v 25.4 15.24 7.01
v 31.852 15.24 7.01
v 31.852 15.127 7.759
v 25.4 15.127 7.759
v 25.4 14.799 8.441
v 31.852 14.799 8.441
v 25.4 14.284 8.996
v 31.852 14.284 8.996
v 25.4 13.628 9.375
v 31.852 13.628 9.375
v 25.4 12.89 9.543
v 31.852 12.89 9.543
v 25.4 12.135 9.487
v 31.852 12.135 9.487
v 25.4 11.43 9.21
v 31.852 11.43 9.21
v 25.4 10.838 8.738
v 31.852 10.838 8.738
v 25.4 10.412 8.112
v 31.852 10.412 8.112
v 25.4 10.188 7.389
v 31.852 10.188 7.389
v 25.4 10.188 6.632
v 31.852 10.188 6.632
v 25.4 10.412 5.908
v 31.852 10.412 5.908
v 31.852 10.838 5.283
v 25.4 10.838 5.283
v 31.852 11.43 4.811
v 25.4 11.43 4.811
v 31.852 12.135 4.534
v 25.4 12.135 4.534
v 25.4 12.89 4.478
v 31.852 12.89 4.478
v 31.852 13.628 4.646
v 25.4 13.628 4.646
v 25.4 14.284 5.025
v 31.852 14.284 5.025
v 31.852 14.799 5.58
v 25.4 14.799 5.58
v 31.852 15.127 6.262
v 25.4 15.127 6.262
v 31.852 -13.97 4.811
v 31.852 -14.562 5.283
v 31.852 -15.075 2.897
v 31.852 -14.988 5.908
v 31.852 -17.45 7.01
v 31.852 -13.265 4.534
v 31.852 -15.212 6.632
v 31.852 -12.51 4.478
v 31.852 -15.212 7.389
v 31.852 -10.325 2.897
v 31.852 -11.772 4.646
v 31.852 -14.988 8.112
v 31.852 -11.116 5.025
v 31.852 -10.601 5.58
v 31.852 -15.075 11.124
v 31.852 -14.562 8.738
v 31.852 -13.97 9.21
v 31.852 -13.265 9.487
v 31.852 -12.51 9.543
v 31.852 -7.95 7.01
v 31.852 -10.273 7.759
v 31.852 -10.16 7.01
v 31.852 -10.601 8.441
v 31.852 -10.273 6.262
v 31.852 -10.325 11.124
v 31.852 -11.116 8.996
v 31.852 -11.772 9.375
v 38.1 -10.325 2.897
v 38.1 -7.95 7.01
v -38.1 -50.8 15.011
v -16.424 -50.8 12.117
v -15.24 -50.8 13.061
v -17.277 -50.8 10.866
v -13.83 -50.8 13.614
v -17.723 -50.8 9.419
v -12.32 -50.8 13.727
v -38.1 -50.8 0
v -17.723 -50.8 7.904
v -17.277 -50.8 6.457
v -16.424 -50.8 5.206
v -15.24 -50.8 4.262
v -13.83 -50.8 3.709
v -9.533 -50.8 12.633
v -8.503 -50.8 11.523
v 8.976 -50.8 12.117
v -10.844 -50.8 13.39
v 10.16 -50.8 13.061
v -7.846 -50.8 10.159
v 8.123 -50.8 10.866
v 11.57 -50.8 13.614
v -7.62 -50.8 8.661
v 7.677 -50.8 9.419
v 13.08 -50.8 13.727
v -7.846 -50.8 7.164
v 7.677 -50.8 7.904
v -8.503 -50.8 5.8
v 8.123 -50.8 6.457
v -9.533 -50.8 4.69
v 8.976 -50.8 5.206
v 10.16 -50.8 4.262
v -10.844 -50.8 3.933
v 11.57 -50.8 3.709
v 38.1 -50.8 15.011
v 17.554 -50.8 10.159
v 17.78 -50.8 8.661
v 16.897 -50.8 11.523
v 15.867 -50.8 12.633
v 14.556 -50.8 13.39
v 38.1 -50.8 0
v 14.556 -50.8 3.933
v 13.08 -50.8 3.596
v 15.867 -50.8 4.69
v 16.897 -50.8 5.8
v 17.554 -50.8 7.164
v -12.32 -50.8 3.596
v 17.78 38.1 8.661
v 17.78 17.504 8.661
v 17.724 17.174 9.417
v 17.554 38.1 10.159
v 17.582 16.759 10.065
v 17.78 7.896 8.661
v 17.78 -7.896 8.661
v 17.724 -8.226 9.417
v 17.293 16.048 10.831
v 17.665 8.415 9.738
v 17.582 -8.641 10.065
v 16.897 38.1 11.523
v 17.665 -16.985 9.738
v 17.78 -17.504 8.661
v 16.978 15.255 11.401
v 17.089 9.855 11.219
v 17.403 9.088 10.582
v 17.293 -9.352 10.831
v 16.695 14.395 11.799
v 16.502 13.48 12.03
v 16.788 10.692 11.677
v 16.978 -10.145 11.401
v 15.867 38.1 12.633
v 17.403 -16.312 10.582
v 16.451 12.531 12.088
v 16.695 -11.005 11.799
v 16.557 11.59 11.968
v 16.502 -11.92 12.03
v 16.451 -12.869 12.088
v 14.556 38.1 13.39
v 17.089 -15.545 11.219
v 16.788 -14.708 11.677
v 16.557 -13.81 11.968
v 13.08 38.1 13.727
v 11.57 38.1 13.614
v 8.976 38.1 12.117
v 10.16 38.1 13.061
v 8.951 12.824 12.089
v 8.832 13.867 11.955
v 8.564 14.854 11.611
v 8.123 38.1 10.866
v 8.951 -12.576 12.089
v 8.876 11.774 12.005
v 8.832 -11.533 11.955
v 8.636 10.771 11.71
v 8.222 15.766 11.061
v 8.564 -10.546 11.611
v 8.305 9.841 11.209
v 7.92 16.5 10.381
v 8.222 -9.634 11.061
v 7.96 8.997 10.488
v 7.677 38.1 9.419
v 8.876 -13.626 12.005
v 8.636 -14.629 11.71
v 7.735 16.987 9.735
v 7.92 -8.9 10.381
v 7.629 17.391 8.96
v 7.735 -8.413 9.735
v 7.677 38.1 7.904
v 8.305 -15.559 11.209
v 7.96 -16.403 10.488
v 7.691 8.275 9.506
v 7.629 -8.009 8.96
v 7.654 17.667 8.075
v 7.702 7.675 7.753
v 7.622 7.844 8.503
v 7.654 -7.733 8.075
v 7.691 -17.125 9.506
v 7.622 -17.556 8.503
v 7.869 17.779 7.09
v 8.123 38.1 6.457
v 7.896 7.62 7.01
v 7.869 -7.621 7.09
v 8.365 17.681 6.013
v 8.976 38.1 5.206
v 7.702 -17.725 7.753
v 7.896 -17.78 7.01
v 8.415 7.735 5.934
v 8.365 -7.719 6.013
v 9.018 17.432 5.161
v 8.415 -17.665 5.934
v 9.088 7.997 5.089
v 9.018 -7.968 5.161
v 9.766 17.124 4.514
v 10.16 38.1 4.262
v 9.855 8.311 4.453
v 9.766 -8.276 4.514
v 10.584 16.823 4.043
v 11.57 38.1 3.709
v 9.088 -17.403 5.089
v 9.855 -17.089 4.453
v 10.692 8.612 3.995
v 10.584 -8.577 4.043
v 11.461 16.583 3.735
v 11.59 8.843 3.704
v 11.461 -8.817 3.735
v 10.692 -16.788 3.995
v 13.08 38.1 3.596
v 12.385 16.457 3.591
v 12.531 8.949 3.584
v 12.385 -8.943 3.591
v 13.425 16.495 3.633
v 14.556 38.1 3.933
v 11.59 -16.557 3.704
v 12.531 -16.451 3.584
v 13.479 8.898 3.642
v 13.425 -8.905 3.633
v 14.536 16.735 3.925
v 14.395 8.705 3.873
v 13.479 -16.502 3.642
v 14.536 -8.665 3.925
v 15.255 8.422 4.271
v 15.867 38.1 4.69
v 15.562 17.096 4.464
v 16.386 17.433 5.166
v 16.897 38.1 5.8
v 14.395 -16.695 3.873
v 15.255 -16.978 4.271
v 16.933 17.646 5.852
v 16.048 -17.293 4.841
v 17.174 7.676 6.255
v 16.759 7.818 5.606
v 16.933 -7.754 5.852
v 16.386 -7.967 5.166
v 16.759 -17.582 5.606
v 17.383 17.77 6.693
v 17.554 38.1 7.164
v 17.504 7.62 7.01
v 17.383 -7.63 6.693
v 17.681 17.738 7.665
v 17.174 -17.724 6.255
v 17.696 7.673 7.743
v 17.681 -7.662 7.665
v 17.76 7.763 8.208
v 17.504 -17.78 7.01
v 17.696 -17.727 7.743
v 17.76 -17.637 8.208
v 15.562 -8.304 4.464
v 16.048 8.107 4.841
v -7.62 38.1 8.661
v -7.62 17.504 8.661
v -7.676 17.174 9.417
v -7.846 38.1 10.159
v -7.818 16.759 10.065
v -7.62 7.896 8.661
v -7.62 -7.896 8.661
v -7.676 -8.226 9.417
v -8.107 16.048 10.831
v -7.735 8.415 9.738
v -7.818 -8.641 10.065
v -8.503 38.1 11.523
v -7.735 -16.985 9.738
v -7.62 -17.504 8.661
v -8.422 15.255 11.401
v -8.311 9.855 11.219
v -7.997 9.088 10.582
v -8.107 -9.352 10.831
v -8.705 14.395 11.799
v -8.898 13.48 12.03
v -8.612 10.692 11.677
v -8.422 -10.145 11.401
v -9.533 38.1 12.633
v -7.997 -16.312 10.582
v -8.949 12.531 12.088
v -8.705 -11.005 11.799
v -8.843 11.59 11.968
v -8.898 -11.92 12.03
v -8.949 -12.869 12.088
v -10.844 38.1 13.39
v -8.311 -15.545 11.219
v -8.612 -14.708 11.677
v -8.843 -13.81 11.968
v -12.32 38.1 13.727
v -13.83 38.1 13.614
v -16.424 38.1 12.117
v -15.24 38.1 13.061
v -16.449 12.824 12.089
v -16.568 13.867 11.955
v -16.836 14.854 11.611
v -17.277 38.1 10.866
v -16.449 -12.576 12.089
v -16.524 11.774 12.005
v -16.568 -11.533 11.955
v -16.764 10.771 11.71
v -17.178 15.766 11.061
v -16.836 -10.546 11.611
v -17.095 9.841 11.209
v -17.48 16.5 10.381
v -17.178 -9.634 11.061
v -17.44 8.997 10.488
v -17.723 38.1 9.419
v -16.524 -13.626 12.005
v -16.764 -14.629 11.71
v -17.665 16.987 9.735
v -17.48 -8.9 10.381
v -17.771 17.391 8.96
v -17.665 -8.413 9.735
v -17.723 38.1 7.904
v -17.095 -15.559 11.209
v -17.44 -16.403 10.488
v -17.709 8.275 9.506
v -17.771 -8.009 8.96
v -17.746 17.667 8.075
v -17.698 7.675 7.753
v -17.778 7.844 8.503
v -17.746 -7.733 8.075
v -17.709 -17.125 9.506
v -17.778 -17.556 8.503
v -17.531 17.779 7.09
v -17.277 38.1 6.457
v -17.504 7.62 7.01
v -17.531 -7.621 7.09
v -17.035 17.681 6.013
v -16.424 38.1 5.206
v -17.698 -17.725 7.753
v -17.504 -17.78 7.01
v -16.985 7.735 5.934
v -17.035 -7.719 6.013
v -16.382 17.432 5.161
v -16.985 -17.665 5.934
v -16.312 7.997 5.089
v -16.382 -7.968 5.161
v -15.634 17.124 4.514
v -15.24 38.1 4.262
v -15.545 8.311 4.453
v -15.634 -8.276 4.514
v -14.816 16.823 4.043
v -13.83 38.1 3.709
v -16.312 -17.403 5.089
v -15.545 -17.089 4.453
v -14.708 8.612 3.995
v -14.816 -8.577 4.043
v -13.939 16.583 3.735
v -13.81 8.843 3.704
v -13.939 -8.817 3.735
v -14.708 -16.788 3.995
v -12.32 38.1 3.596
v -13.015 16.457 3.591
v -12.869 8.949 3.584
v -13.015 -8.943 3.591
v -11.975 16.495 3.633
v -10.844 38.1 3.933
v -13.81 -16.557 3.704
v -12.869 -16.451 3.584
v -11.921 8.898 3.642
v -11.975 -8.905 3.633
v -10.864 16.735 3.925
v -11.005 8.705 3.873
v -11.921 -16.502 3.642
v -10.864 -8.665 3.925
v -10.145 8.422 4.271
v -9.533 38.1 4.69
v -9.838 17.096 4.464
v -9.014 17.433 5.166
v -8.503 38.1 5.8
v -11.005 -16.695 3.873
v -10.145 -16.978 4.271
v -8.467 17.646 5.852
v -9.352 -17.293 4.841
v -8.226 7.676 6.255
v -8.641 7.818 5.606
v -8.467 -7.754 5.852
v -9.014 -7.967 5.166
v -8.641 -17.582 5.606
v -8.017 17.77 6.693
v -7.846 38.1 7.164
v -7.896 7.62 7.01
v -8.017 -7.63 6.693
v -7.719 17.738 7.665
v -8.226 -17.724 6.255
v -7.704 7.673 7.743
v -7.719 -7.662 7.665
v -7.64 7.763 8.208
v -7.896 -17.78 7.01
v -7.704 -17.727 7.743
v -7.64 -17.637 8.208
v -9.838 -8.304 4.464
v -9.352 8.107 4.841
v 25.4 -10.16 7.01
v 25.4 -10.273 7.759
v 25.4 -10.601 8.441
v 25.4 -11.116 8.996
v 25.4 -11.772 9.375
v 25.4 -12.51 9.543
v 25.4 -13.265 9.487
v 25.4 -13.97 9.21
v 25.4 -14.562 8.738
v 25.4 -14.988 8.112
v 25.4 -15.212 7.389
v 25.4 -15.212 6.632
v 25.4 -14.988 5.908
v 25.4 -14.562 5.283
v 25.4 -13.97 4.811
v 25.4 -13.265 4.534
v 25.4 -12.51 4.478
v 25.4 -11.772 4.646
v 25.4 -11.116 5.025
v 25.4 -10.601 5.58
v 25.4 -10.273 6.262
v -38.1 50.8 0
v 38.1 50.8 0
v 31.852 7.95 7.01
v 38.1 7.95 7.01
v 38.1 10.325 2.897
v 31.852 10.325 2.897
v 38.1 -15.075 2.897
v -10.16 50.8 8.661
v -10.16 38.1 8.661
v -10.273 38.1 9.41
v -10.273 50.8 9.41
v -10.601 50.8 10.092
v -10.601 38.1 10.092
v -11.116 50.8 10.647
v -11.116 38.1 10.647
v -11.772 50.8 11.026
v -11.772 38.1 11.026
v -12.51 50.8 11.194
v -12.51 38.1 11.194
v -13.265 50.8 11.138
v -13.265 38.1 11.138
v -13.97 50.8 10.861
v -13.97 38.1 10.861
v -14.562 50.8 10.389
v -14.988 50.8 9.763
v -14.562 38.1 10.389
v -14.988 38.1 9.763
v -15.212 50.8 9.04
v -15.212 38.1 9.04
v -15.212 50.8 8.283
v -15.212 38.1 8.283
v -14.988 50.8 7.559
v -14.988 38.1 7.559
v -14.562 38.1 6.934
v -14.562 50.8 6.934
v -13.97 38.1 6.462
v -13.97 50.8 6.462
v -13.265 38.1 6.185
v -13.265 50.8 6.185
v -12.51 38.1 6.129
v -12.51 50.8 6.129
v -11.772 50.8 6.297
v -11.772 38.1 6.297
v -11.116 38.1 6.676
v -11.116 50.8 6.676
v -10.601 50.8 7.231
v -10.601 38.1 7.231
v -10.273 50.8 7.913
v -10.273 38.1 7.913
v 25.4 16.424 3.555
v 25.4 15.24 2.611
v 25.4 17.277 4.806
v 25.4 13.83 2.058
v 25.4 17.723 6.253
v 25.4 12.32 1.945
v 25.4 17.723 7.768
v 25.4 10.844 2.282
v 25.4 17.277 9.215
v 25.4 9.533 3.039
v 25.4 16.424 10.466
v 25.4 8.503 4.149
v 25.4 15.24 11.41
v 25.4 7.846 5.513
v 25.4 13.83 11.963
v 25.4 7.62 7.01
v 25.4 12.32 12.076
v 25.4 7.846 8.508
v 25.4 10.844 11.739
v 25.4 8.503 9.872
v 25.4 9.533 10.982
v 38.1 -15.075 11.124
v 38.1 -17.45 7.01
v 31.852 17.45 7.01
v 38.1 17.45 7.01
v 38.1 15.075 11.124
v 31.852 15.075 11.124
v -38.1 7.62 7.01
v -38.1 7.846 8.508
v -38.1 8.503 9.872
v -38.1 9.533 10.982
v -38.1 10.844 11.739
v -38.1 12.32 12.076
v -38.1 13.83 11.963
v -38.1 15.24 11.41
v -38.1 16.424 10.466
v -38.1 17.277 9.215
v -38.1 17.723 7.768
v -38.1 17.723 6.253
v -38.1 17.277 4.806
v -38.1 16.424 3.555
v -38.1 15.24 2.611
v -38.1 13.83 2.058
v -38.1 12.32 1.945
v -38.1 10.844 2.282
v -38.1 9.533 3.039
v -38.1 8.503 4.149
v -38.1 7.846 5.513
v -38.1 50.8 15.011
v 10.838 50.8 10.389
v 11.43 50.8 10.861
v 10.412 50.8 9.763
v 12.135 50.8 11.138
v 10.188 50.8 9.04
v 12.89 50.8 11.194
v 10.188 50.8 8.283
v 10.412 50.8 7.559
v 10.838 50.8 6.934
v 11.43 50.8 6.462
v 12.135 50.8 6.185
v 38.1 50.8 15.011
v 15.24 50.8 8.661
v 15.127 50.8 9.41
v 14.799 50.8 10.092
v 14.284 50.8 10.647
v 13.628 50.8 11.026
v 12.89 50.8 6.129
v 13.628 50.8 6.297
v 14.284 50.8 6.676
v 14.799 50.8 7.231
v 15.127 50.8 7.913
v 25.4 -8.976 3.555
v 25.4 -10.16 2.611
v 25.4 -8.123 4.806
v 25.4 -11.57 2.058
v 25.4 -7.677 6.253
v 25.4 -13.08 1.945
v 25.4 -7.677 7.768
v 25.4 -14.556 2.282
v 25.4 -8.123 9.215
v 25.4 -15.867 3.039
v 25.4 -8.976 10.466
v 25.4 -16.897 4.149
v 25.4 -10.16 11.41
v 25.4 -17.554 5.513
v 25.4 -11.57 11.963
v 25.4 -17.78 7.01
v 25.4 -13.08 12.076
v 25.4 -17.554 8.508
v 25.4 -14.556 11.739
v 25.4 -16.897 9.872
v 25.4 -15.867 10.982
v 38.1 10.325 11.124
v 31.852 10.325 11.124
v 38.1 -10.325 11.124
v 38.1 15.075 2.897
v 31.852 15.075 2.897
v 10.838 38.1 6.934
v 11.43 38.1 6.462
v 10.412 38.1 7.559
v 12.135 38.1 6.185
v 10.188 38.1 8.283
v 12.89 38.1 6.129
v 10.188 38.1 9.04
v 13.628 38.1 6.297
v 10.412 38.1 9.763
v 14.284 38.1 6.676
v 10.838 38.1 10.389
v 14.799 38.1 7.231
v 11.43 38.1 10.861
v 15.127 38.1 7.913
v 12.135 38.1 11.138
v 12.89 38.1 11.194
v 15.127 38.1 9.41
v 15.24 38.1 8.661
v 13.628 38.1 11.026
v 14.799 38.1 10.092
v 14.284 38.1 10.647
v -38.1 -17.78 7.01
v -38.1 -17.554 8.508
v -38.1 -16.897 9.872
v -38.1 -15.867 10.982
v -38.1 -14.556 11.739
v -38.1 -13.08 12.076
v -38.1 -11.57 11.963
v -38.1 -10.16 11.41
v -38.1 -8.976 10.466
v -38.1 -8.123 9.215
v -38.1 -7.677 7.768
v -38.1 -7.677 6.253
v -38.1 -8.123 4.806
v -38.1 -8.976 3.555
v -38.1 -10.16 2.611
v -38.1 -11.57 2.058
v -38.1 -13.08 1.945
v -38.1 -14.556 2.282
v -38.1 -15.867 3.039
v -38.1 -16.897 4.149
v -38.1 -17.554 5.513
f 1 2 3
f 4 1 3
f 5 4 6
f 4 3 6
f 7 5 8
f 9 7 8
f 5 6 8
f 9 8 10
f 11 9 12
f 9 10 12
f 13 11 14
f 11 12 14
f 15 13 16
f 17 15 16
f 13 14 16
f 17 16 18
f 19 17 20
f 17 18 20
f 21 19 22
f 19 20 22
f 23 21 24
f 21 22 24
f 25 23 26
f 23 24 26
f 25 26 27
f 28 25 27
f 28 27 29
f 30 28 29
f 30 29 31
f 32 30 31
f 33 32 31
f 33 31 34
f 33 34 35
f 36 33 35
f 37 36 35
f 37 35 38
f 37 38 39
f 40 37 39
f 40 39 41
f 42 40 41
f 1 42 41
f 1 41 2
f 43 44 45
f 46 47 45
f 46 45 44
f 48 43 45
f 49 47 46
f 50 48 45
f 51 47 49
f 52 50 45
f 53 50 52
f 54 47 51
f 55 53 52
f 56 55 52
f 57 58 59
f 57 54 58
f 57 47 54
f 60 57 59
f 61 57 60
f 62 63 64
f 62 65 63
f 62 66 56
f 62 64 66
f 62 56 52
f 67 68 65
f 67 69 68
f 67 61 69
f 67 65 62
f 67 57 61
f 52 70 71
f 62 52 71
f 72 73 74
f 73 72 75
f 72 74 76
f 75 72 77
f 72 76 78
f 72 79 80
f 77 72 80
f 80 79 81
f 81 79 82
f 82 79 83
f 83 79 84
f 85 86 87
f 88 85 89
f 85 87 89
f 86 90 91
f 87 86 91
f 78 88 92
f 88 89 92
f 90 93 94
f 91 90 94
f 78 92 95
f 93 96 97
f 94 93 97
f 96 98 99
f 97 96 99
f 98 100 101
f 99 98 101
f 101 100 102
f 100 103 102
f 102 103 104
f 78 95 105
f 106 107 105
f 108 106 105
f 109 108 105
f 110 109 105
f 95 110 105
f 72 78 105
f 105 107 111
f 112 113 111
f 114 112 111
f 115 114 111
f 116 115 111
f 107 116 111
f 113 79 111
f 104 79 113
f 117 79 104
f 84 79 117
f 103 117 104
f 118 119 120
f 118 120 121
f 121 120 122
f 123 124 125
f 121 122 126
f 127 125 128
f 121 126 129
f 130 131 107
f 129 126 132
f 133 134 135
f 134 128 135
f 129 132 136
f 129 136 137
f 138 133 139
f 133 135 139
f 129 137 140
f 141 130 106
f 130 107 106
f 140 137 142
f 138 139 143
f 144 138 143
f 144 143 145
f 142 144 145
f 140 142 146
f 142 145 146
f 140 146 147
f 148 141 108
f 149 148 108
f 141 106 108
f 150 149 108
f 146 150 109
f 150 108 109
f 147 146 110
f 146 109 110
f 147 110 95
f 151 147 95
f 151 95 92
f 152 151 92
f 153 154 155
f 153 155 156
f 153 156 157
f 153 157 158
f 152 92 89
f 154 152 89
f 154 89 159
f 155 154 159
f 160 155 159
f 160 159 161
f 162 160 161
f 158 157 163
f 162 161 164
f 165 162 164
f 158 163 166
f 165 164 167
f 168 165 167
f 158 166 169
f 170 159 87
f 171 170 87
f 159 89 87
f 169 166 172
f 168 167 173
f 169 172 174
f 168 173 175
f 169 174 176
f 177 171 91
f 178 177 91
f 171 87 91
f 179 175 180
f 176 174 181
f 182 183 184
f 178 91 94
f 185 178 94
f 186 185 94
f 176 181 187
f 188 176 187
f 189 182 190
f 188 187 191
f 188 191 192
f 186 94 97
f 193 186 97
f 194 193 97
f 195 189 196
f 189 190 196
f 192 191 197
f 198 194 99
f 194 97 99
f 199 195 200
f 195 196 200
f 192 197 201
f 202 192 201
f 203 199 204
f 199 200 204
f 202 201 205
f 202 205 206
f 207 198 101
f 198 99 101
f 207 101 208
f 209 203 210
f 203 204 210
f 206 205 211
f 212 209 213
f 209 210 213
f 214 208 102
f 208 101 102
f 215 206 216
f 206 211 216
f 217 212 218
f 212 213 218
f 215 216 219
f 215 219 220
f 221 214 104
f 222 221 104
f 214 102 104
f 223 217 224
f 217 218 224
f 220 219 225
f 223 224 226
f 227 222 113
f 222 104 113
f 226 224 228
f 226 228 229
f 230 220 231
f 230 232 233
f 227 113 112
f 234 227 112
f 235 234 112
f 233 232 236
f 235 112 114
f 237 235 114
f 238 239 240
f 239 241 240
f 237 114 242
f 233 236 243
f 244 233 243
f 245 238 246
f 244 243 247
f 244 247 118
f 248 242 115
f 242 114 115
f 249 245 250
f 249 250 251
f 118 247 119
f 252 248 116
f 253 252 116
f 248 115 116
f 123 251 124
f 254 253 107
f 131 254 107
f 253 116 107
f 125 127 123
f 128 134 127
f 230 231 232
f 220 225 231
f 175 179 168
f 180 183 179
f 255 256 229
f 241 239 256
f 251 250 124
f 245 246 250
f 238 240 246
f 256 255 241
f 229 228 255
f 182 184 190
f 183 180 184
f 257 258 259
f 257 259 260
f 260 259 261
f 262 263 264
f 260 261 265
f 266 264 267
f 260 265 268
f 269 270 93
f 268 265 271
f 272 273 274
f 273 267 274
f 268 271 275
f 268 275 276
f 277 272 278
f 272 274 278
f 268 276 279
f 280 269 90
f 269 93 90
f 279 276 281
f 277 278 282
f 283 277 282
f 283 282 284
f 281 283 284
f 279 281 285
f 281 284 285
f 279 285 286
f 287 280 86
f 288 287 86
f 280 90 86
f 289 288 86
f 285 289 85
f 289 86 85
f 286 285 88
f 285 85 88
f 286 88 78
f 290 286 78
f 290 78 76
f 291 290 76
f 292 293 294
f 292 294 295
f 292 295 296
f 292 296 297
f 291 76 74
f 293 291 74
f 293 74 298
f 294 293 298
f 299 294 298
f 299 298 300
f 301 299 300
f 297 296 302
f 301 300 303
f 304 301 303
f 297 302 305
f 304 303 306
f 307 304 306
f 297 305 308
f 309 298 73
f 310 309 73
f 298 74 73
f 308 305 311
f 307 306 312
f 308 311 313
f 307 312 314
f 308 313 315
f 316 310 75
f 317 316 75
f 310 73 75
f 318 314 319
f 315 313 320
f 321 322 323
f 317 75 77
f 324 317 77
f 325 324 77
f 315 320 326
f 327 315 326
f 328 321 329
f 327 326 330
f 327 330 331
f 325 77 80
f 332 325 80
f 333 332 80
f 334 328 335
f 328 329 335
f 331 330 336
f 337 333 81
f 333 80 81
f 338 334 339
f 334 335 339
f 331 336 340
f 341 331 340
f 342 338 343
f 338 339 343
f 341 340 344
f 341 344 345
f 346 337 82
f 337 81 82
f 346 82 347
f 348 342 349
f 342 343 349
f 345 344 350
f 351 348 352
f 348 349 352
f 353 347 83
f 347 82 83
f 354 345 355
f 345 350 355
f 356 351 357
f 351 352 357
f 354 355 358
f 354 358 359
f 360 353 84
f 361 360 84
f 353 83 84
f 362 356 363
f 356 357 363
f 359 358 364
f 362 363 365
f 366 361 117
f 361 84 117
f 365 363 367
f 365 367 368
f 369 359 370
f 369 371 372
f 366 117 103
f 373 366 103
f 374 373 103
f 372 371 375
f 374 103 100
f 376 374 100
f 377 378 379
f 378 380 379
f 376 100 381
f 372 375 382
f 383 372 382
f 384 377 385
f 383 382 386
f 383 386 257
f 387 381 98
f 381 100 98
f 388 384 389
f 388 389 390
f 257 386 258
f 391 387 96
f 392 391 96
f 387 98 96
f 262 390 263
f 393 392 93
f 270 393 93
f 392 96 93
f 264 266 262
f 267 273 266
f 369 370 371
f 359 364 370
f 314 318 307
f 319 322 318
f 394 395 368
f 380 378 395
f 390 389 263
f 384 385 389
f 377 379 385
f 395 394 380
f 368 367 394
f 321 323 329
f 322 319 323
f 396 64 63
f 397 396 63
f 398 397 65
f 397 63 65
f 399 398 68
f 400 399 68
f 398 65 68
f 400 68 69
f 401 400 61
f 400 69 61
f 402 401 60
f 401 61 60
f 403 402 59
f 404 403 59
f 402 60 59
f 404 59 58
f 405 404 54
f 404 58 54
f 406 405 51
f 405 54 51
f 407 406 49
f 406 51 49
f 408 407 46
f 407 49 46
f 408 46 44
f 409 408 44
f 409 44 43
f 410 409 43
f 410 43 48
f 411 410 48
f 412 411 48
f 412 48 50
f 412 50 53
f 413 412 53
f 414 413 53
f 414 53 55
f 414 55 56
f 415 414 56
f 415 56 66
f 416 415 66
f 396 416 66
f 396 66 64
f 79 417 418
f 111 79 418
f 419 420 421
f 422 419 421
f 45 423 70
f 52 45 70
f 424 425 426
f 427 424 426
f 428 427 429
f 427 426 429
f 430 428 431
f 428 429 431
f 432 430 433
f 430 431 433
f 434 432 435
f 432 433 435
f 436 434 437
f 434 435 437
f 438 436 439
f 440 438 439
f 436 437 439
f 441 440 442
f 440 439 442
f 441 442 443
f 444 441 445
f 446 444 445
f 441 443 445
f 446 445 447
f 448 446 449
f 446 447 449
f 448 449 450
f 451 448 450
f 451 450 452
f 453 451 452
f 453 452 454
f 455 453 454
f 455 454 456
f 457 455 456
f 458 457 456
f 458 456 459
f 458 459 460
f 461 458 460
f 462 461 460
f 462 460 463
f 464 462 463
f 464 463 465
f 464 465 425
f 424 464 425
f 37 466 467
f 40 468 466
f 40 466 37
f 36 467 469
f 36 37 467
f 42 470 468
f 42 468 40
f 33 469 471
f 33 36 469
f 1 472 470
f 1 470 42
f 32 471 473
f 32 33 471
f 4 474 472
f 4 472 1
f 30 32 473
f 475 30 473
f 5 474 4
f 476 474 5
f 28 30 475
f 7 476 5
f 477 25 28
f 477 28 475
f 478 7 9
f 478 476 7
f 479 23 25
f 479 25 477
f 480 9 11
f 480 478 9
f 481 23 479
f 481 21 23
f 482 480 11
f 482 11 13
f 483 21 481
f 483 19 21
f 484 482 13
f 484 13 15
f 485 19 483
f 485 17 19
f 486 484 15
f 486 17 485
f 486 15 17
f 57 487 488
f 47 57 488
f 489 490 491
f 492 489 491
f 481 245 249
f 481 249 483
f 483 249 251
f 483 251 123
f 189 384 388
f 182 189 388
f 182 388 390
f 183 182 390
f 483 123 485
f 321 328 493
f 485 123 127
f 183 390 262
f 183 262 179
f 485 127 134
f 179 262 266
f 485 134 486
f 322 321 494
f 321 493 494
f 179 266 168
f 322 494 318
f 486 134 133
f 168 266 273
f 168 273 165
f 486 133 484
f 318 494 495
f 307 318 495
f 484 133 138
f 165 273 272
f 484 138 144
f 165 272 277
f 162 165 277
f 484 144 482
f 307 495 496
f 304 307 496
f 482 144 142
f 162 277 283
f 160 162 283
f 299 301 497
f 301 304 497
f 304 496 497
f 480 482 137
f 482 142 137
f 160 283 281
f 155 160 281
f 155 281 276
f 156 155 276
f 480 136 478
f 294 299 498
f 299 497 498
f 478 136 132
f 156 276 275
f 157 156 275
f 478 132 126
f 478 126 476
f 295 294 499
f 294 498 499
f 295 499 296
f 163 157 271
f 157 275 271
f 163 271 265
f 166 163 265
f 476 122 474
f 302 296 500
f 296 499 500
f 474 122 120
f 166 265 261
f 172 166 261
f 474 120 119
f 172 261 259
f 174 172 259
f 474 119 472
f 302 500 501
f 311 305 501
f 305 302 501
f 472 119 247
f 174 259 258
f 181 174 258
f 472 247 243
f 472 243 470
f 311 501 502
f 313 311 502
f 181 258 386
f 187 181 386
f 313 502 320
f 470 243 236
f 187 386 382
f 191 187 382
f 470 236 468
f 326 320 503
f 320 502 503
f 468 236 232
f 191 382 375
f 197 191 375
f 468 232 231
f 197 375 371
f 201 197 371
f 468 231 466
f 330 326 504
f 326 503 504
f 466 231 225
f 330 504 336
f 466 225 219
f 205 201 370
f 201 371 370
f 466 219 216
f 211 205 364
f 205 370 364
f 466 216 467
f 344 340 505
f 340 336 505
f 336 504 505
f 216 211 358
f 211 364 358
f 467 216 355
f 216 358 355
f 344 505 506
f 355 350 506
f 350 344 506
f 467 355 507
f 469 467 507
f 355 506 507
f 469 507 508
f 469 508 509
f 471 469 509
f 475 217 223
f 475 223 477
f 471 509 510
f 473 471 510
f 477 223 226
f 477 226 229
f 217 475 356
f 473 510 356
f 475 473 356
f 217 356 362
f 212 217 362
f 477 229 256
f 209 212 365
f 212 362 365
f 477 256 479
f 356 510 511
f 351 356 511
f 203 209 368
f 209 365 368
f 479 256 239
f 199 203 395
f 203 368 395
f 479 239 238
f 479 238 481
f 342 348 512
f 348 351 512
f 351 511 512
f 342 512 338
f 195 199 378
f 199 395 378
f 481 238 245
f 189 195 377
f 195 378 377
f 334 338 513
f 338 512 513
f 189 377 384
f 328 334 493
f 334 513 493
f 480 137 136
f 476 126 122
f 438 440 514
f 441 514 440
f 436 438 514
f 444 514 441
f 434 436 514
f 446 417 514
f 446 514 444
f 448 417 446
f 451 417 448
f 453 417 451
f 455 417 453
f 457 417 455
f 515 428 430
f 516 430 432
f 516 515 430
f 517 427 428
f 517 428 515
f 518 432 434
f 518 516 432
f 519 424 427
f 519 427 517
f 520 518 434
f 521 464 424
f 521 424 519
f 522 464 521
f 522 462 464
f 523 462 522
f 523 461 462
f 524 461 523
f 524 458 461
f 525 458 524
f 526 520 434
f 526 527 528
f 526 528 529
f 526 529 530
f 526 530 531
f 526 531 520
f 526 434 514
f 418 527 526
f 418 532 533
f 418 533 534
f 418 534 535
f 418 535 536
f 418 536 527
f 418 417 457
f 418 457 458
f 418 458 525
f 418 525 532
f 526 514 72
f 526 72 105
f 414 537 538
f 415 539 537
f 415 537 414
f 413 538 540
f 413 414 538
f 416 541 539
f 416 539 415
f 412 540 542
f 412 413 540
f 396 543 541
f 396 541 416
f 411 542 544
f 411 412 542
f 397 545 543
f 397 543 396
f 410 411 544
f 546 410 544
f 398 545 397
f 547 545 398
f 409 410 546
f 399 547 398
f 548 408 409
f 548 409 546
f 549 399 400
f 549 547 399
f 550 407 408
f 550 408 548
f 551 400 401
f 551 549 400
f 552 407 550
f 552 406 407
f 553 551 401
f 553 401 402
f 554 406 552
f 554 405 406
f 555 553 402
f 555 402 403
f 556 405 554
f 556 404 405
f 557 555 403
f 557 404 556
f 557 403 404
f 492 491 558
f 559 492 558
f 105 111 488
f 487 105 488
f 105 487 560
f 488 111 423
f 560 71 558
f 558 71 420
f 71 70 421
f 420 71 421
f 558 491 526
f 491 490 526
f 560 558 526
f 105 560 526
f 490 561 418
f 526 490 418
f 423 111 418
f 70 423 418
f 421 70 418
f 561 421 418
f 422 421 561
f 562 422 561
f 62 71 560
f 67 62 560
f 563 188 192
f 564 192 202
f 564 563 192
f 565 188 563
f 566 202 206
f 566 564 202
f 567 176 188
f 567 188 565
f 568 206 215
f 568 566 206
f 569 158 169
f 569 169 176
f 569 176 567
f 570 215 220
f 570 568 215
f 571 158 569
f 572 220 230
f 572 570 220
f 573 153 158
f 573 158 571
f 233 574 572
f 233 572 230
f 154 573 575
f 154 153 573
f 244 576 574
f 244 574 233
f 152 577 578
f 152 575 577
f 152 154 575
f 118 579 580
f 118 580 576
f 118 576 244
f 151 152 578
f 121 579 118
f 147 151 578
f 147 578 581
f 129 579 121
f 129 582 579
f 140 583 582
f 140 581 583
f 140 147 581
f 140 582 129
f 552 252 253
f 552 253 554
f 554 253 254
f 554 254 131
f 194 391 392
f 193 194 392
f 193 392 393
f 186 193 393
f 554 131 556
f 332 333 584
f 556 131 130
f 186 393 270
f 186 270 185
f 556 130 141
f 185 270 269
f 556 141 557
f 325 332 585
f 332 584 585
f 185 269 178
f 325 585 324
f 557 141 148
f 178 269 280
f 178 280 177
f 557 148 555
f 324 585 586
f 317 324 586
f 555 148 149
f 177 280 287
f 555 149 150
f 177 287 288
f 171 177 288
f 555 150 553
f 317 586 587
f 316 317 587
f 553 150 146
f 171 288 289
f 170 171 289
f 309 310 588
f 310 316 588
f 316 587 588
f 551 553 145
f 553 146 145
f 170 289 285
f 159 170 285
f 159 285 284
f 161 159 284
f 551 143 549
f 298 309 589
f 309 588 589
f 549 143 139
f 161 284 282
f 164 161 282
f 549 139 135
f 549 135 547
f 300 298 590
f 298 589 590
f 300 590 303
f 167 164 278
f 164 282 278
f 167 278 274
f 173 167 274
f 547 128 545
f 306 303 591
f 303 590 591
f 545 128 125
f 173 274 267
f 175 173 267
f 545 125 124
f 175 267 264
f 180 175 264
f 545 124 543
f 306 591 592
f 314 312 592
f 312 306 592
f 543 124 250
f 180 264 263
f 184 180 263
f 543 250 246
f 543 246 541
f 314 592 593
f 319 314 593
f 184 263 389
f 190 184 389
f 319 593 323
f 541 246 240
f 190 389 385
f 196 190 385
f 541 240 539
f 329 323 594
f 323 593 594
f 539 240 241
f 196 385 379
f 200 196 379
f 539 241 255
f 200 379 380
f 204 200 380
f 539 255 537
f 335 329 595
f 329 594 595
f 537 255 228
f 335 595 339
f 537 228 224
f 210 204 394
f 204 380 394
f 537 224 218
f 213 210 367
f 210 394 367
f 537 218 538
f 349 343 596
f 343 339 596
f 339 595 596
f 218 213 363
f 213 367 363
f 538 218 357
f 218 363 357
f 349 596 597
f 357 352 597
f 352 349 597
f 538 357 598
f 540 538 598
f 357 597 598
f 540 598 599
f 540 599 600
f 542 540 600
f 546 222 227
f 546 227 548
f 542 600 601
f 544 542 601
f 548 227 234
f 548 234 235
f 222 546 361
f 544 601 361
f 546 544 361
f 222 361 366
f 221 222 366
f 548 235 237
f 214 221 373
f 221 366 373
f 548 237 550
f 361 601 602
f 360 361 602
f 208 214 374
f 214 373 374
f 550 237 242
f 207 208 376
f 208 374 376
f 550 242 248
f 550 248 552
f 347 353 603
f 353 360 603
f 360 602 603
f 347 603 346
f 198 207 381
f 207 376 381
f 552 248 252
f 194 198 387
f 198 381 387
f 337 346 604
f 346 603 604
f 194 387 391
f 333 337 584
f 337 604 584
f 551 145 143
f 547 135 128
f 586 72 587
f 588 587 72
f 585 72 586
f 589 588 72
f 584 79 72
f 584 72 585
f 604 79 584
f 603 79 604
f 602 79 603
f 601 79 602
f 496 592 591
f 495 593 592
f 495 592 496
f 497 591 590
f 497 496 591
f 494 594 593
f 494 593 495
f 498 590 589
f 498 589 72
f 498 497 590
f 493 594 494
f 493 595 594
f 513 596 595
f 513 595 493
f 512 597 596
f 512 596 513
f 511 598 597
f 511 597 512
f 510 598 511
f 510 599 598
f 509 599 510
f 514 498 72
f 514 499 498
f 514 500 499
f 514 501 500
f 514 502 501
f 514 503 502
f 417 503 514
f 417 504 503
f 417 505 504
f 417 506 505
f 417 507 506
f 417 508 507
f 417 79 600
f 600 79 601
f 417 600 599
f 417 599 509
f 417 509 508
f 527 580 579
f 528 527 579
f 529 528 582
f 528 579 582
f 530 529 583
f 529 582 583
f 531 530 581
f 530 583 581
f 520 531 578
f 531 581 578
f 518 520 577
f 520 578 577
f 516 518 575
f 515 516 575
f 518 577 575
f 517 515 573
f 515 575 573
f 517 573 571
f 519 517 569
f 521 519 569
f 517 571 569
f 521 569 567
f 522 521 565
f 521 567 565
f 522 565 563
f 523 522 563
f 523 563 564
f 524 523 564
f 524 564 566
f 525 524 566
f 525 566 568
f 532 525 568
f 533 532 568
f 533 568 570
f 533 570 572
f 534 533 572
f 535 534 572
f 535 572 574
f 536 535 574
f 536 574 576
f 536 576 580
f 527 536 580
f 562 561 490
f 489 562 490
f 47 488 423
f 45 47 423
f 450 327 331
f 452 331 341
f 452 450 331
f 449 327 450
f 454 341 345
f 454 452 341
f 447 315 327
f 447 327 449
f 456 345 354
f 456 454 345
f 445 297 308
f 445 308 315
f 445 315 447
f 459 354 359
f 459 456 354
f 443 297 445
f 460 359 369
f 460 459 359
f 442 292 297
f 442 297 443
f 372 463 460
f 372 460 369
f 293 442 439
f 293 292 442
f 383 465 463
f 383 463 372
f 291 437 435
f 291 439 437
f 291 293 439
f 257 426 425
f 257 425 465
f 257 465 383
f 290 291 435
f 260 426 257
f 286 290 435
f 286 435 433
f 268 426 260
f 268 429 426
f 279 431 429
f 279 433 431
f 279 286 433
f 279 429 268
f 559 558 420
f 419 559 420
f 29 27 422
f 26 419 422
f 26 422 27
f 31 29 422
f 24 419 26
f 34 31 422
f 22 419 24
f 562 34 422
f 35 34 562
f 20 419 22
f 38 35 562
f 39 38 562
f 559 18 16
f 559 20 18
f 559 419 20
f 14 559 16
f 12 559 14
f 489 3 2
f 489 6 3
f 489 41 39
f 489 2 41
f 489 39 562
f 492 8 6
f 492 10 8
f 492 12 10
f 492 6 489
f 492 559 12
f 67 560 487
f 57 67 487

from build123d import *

# Parameters (mm, degrees)
F0_W      = 76.2
F0_H      = 101.6
F1_DEPTH  = 15.0114
F2_R      = 2.54
F3_DEPTH  = 101.601
F4_R      = 5.08
F5_DEPTH  = 88.9
F7_DEPTH  = 6.2484
F8_R      = 2.54
F9_DEPTH  = 69.9526
F10_R     = 5.08
F11_DEPTH = 63.5


with BuildPart() as f1:
    # F0 (on Top) → F1 (new body)
    with BuildSketch(Plane.XY):
        Rectangle(F0_W, F0_H)
    extrude(amount=F1_DEPTH)

    # F2 (on face) → F3 (cut, through all)
    with BuildSketch(Plane.XZ.offset(50.8)):
        with Locations((-12.7, 8.6614)):
            Circle(F2_R)
        with Locations((12.7, 8.6614)):
            Circle(F2_R)
    extrude(amount=-F3_DEPTH, mode=Mode.SUBTRACT)

    # F4 (on face) → F5 (cut, through all)
    with BuildSketch(Plane.XZ.offset(50.8)):
        with Locations((-12.7, 8.6614)):
            Circle(F4_R)
        with Locations((12.7, 8.6614)):
            Circle(F4_R)
    extrude(amount=-F5_DEPTH, mode=Mode.SUBTRACT)

    # F6 (on face) → F7 (cut)
    with BuildSketch(Plane.YZ.offset(38.1)):
        Polygon((-15.0749, 11.1238474629), (-17.4498, 7.0104), (-15.0749, 2.8969525371), (-10.3251, 2.8969525371), (-7.9502, 7.0104), (-10.3251, 11.1238474629), align=None)
        Polygon((10.3251, 11.1238474629), (7.9502, 7.0104), (10.3251, 2.8969525371), (15.0749, 2.8969525371), (17.4498, 7.0104), (15.0749, 11.1238474629), align=None)
    extrude(amount=-F7_DEPTH, mode=Mode.SUBTRACT)

    # F8 (on face) → F9 (cut, through all)
    with BuildSketch(Plane.YZ.offset(31.8516)):
        with Locations((-12.7, 7.0104)):
            Circle(F8_R)
        with Locations((12.7, 7.0104)):
            Circle(F8_R)
    extrude(amount=-F9_DEPTH, mode=Mode.SUBTRACT)

    # F10 (on face) → F11 (cut, through all)
    with BuildSketch(Plane(origin=(-38.1, 0, 0), x_dir=(0, -1, 0), z_dir=(-1, 0, 0))):
        with Locations((-12.7, 7.0104)):
            Circle(F10_R)
        with Locations((12.7, 7.0104)):
            Circle(F10_R)
    extrude(amount=-F11_DEPTH, mode=Mode.SUBTRACT)


solid = f1.part
